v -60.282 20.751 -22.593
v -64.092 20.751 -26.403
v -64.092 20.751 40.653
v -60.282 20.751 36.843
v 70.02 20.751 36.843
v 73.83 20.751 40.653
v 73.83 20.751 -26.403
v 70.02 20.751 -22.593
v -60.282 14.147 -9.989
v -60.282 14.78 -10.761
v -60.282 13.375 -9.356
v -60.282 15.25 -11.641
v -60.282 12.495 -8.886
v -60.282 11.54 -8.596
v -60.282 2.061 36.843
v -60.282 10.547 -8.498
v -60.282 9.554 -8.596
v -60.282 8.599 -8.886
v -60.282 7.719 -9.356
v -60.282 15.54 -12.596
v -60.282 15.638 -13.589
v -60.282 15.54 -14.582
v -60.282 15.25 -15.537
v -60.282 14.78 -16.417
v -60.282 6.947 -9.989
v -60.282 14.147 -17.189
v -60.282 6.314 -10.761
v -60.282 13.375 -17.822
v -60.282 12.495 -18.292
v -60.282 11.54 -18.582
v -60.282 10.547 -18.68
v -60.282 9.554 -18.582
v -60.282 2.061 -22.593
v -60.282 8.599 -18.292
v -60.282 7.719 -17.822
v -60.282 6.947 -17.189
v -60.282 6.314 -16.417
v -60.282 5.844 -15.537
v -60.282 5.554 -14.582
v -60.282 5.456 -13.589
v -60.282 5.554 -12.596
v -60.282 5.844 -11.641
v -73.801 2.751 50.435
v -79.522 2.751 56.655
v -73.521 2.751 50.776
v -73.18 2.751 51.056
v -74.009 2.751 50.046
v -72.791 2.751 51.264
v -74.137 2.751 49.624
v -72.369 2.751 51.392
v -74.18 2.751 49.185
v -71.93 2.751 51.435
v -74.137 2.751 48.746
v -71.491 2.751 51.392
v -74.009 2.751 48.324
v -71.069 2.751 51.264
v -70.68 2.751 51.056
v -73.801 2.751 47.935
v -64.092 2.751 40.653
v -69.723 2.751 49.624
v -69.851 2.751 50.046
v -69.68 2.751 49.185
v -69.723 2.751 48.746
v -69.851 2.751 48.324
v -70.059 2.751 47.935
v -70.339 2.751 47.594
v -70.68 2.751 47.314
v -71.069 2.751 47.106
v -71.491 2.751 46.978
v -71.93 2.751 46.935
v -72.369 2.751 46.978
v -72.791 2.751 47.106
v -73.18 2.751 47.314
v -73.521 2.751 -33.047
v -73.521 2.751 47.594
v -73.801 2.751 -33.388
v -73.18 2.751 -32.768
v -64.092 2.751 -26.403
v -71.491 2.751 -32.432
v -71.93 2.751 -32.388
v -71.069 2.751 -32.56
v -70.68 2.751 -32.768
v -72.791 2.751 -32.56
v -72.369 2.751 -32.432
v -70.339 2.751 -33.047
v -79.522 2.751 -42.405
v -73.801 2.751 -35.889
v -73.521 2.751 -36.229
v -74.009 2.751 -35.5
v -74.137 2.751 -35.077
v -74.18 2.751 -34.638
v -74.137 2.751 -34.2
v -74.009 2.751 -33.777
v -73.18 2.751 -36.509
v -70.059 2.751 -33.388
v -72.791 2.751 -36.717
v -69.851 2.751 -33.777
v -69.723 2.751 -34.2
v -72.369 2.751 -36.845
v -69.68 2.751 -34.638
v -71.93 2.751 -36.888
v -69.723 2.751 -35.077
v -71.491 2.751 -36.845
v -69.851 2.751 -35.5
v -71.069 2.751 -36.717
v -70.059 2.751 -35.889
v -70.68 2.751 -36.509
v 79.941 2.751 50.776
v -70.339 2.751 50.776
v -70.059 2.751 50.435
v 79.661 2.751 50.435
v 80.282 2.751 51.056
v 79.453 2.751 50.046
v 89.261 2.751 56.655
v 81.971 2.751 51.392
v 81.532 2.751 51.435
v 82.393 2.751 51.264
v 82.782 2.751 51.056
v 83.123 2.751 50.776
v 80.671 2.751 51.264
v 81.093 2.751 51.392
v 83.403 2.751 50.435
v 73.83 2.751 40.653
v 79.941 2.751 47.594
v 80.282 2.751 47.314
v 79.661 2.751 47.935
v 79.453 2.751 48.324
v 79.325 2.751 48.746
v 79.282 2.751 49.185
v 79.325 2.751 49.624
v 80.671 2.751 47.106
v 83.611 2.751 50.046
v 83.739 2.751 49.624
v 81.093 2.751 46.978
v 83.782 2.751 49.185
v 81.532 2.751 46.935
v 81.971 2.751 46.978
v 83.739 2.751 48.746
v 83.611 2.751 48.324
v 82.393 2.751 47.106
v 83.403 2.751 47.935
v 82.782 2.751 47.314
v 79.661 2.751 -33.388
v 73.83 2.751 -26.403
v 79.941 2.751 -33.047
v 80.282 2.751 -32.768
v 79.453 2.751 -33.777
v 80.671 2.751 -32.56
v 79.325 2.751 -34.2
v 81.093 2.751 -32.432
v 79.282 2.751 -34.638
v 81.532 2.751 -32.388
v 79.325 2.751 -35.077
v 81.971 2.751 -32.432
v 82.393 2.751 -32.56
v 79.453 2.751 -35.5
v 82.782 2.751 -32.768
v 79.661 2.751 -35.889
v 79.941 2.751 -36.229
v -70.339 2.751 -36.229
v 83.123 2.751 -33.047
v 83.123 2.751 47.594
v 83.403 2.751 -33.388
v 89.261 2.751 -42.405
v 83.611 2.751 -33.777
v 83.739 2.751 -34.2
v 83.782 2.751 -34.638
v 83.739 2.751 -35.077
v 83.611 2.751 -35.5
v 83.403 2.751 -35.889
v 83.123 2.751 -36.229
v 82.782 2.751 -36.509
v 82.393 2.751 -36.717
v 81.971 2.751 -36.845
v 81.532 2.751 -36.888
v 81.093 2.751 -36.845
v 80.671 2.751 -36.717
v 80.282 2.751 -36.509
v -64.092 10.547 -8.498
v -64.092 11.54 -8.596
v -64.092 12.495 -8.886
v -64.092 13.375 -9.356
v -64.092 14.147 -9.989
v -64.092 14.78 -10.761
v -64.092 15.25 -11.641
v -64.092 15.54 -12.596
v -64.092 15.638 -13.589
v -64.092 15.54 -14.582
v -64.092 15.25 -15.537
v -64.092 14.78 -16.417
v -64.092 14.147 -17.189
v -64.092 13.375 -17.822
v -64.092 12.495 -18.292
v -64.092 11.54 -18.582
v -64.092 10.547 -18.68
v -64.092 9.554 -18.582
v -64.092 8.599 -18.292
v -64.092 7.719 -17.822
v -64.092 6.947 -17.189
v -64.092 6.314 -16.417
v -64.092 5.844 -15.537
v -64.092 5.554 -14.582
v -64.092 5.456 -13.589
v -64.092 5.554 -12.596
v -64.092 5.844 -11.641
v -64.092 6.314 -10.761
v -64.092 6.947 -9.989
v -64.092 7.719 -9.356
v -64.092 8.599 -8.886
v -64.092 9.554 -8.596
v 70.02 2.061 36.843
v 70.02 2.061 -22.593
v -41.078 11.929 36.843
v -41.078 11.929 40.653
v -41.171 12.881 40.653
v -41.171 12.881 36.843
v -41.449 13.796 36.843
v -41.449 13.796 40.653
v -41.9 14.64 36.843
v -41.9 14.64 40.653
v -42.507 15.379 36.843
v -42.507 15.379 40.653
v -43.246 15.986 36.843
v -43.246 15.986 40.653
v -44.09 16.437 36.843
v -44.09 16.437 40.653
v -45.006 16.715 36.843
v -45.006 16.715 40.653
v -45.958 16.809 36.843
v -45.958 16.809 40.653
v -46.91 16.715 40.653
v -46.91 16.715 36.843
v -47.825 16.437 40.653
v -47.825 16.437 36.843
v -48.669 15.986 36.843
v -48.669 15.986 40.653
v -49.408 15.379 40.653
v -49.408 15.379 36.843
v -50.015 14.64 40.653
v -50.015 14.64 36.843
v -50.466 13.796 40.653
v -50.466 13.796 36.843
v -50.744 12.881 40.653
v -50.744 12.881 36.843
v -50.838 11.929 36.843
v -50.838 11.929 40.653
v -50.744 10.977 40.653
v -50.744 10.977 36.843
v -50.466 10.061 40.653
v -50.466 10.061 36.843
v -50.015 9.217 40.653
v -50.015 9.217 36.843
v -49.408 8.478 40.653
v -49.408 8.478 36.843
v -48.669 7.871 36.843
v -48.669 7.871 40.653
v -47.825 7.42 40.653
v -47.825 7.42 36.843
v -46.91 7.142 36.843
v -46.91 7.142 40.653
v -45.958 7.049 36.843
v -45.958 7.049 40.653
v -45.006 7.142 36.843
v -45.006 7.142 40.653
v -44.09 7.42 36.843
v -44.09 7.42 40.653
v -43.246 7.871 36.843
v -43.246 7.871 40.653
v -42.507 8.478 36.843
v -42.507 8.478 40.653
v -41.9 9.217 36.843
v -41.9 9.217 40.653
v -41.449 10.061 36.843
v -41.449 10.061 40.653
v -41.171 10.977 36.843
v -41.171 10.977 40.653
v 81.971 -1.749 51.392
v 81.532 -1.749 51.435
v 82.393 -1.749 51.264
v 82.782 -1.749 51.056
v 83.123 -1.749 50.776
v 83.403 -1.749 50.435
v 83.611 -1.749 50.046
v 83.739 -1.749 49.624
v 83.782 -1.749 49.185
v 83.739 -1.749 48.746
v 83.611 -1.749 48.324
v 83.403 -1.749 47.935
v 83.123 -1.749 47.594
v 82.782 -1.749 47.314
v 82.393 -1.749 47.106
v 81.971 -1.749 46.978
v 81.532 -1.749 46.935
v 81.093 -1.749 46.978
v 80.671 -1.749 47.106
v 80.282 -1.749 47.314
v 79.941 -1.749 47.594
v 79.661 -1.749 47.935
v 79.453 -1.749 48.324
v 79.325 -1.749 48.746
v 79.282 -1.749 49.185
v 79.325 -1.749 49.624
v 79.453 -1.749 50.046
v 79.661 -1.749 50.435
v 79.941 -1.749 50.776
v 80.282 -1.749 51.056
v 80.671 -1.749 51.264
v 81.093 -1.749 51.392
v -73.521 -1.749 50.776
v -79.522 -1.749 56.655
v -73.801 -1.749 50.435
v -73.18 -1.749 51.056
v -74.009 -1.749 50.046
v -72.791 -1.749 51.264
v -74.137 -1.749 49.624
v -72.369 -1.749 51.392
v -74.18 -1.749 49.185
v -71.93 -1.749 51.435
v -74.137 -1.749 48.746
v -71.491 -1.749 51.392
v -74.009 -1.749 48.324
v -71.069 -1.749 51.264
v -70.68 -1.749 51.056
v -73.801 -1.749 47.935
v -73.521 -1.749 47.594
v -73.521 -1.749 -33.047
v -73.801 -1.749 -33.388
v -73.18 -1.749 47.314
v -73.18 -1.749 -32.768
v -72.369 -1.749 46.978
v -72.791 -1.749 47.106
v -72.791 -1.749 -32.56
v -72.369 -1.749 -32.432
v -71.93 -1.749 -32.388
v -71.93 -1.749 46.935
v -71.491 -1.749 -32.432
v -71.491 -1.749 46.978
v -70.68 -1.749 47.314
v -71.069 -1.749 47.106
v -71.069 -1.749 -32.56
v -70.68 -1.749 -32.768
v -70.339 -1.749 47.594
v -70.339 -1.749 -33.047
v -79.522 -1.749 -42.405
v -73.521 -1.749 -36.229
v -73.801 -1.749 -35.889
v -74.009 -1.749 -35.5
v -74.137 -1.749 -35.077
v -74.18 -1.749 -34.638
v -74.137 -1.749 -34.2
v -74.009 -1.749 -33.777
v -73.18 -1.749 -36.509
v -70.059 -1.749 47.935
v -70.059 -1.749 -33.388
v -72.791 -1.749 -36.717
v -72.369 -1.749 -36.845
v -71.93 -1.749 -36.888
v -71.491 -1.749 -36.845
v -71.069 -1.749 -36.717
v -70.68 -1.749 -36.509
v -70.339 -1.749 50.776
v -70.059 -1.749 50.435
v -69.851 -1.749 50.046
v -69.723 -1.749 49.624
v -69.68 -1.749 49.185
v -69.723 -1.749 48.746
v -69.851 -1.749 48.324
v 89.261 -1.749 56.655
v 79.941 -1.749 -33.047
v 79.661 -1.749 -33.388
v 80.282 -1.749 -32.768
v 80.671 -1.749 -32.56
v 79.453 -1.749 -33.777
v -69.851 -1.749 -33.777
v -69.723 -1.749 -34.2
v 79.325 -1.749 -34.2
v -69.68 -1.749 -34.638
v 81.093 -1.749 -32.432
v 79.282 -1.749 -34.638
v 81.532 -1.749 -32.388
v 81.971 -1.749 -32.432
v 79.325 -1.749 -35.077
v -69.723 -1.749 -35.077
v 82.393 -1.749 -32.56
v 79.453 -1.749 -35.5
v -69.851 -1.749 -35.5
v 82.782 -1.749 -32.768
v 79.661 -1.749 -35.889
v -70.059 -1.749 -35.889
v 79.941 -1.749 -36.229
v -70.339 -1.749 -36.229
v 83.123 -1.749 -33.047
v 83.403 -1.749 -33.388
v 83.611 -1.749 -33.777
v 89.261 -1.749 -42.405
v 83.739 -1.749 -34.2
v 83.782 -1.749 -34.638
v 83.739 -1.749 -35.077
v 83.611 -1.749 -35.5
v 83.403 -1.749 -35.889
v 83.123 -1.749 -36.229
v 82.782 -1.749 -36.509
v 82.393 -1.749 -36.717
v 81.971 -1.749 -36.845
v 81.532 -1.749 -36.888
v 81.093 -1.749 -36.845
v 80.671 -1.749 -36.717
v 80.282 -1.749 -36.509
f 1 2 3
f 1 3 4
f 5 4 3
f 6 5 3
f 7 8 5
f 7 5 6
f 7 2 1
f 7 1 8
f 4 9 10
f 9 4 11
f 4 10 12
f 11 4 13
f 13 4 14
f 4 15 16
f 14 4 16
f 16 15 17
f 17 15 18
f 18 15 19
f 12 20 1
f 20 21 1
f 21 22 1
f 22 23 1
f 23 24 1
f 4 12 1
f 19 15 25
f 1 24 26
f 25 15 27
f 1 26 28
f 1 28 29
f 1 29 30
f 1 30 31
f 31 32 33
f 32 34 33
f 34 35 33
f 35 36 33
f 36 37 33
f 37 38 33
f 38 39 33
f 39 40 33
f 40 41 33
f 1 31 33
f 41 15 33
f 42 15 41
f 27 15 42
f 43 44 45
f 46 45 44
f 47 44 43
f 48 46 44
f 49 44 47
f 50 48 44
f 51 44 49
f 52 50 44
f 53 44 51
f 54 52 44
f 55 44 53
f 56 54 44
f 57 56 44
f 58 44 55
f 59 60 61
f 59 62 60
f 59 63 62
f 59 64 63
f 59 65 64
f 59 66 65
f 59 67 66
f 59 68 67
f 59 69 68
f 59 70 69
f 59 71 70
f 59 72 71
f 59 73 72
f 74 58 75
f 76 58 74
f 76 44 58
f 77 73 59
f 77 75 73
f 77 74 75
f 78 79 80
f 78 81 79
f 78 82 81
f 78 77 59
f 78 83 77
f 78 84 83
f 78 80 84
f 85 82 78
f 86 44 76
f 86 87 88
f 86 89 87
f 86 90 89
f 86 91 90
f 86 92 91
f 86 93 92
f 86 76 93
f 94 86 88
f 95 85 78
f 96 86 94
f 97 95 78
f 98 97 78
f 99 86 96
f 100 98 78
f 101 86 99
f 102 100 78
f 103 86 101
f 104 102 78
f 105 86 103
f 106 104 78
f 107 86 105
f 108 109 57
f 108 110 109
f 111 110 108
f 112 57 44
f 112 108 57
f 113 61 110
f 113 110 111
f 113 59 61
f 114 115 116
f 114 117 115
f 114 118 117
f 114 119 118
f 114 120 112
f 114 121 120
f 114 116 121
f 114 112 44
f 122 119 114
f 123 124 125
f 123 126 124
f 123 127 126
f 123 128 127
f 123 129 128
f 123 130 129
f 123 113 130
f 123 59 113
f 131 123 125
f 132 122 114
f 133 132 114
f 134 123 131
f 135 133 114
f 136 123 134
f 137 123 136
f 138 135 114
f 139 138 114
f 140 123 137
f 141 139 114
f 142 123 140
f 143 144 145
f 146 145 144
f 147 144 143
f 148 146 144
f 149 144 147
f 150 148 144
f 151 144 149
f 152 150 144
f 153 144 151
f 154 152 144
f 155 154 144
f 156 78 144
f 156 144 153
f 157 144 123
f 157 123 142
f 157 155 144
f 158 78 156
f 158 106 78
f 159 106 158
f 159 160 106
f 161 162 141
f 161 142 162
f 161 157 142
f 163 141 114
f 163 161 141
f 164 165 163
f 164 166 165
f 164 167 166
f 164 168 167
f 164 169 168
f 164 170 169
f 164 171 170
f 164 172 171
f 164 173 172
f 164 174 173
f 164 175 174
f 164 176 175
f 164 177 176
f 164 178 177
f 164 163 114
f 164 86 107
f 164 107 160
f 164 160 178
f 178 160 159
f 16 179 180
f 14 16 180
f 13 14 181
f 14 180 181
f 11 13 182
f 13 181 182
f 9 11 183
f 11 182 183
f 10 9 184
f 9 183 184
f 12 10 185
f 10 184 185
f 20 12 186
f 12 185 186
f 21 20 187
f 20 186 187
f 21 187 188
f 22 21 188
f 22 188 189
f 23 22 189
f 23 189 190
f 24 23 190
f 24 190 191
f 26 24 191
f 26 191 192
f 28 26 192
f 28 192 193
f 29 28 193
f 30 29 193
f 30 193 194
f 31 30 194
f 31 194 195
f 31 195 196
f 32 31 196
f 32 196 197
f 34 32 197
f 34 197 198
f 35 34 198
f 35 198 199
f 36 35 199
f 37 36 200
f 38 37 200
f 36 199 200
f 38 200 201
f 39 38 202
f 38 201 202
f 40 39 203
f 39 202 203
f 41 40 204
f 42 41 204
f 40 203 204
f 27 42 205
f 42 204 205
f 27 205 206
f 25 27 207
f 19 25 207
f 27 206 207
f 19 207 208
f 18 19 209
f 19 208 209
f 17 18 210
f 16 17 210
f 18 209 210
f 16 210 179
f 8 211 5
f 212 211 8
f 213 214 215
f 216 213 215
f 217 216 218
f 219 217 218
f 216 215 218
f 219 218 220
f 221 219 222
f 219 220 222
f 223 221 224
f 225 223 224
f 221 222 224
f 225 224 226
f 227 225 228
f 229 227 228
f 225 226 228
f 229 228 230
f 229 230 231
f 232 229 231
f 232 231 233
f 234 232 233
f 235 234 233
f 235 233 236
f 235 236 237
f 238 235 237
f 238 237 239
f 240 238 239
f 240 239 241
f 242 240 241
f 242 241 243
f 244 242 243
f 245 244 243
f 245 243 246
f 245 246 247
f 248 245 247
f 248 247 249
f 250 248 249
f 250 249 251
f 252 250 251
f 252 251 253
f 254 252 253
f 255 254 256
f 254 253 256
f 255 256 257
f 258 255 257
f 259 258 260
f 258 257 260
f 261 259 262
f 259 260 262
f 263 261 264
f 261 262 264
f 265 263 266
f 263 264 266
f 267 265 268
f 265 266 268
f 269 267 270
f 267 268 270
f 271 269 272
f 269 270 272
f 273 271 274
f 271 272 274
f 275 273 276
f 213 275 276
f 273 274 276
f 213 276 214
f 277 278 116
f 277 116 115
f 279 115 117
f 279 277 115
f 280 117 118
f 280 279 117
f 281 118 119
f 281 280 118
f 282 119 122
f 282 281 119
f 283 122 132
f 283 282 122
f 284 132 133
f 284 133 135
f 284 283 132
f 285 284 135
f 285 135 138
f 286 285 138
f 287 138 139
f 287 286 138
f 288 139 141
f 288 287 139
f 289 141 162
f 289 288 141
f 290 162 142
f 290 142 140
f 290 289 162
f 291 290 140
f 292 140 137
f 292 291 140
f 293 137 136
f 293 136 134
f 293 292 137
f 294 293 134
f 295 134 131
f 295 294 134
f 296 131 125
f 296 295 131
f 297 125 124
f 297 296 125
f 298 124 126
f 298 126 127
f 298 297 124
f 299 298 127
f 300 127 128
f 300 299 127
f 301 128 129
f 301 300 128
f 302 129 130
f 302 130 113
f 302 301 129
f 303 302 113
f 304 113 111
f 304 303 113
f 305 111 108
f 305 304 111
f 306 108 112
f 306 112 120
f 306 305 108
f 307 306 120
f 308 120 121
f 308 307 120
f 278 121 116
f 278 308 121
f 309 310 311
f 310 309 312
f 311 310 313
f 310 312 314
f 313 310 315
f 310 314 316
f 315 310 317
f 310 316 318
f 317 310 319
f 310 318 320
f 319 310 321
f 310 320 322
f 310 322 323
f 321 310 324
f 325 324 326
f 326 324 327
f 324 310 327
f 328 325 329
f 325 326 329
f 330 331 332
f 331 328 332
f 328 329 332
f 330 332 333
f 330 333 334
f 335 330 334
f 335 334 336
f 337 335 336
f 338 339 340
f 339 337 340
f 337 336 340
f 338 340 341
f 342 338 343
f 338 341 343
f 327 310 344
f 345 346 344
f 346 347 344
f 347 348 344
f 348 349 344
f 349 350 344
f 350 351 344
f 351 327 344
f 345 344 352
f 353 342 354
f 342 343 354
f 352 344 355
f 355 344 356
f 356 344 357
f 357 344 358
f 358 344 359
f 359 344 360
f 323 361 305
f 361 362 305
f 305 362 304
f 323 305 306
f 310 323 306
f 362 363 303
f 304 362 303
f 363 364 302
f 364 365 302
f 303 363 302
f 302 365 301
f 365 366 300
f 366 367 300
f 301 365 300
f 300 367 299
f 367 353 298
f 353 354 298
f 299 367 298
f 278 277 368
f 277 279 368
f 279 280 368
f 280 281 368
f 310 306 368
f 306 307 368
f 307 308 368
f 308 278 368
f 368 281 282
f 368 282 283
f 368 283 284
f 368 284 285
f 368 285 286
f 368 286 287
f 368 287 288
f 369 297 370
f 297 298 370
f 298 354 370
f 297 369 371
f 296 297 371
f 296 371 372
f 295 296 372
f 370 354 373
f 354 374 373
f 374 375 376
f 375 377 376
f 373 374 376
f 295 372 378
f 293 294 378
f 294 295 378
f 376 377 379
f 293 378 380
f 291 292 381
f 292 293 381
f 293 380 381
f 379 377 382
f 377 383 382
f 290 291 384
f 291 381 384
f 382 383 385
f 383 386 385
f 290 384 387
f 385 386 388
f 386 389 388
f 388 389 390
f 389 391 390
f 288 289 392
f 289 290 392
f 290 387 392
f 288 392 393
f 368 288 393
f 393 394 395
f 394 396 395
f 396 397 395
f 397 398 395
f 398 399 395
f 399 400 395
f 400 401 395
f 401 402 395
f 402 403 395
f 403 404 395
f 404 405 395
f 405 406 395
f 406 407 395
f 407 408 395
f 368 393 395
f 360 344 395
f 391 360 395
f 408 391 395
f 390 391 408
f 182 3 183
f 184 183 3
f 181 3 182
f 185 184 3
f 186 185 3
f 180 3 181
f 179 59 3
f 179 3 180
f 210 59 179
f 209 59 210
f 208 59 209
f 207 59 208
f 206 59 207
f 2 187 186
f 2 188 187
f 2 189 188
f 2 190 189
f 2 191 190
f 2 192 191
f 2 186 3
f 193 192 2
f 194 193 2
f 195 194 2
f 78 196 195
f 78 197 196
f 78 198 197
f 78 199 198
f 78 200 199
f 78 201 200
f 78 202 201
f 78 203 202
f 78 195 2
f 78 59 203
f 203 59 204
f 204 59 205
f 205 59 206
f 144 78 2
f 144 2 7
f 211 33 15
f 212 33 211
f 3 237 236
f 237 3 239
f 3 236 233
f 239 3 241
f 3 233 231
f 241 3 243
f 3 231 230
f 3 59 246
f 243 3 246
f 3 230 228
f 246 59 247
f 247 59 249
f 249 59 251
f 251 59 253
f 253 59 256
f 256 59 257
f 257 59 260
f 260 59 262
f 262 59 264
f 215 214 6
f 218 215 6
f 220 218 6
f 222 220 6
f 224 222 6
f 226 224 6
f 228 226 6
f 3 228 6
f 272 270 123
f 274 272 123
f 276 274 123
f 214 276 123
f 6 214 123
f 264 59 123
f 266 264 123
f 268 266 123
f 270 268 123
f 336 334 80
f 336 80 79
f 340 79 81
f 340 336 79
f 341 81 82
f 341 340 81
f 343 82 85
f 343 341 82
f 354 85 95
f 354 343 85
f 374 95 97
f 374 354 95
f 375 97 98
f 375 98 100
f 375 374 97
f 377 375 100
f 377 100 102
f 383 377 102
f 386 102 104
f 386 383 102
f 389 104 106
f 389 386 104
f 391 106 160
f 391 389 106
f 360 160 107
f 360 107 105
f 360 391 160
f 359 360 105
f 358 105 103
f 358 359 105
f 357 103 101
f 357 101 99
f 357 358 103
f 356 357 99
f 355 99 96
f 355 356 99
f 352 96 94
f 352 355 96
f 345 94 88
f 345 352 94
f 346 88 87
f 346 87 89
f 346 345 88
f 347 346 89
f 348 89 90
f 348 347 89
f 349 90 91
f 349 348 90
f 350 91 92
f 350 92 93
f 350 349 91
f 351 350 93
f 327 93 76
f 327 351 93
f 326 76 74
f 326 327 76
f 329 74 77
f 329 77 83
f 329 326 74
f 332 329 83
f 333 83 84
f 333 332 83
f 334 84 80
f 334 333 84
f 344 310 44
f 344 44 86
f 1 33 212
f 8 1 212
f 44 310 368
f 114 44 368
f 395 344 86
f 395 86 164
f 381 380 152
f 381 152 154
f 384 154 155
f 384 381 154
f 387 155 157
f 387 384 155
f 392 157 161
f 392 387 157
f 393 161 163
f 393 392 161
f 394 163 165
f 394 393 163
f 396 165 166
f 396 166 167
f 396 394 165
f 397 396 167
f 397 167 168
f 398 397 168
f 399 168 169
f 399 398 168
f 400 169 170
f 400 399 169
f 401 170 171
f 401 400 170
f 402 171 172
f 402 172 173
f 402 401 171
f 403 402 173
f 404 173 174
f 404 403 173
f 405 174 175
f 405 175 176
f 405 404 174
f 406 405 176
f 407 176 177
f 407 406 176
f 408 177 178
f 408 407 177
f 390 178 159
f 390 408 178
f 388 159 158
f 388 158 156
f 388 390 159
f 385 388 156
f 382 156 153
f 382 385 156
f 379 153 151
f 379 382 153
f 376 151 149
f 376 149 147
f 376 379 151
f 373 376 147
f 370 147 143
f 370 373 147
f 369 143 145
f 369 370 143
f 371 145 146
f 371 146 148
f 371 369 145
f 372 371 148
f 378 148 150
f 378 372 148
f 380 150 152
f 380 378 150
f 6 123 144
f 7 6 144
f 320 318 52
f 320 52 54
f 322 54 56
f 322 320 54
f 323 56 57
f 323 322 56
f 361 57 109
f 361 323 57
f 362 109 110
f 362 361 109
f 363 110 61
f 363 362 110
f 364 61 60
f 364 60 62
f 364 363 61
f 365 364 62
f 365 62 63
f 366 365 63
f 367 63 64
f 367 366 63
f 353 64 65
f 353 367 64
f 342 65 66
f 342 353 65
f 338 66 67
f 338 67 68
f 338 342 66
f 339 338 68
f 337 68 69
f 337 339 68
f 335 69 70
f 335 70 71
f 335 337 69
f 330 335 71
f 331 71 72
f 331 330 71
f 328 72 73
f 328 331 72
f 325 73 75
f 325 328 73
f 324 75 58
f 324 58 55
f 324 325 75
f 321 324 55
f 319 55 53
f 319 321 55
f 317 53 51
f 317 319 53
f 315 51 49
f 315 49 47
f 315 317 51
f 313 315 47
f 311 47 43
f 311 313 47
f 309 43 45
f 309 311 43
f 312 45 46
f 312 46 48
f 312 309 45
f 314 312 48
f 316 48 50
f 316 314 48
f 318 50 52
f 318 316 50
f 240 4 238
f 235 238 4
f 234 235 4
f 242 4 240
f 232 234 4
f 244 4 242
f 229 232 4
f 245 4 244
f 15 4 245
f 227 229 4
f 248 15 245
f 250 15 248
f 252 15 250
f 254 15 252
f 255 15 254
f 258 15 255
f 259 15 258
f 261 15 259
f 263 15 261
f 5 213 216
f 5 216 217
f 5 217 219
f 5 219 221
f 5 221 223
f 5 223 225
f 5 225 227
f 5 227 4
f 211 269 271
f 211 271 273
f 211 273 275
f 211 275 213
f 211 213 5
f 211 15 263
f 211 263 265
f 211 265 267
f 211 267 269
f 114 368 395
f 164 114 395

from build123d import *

# Parameters (mm, degrees)
SKETCH1_W           = 112.522
SKETCH1_H           = 66.04
SKETCH1_R           = 1.5
BOSS_EXTRUDE1_DEPTH = 3
SKETCH4_W           = 91.948
SKETCH4_H           = 44.704
BOSS_EXTRUDE2_DEPTH = 12
SHELL1_T            = -2.54
SKETCH13_R          = 3.253406585
CUT_EXTRUDE1_DEPTH  = 8.19
SKETCH15_R          = 3.393829234
CUT_EXTRUDE2_DEPTH  = 8.19
SCALE1_SCALE        = 1.5


with BuildPart() as part:
    # Sketch1 → Boss-Extrude1 (new body)
    with BuildSketch(Plane(origin=(0, 0, 0), x_dir=(1, 0, 0), z_dir=(0, 1, 0))):
        with Locations((4.991983213, -7.115654676)):
            Rectangle(SKETCH1_W, SKETCH1_H)
        with Locations(Location((-46.207741765, 20.726518927, 0), (0, 0, 270))):
            Circle(SKETCH1_R, mode=Mode.SUBTRACT)
        with Locations(Location((56.100367261, 20.726518927, 0), (0, 0, 270))):
            Circle(SKETCH1_R, mode=Mode.SUBTRACT)
        with Locations(Location((56.100367261, -35.155923699, 0), (0, 0, 270))):
            Circle(SKETCH1_R, mode=Mode.SUBTRACT)
        with Locations(Location((-46.207741765, -35.155923699, 0), (0, 0, 270))):
            Circle(SKETCH1_R, mode=Mode.SUBTRACT)
    extrude(amount=BOSS_EXTRUDE1_DEPTH)

    # Sketch4 → Boss-Extrude2 (add)
    with BuildSketch(Plane(origin=(0, 3, 0), x_dir=(1, 0, 0), z_dir=(0, 1, 0))):
        with Locations((4.991983213, -7.115654676)):
            Rectangle(SKETCH4_W, SKETCH4_H)
    extrude(amount=BOSS_EXTRUDE2_DEPTH)

    # Shell1
    shell1_openings = [part.faces().sort_by_distance(p)[0] for p in [
        (4.991983213, 15, 7.115654676),
    ]]
    offset(amount=SHELL1_T, openings=shell1_openings, kind=Kind.INTERSECTION)

    # Sketch13 → Cut-Extrude1 (cut)
    with BuildSketch(Plane.XY.offset(29.467654676)):
        with Locations((-28.892784248, 9.118527178)):
            Circle(SKETCH13_R)
    extrude(amount=-CUT_EXTRUDE1_DEPTH, mode=Mode.SUBTRACT)

    # Sketch15 → Cut-Extrude2 (cut)
    with BuildSketch(Plane.ZY.offset(40.982016787)):
        with Locations((-6.693412029, 8.197427611)):
            Circle(SKETCH15_R)
    extrude(amount=-CUT_EXTRUDE2_DEPTH, mode=Mode.SUBTRACT)


with BuildPart() as part_1:
    # Scale1: scaled about (5.236972756, 3.498136201, 7.097395086)
    add(part.part.scale(SCALE1_SCALE).moved(Location((-2.618486378, -1.7490681, -3.548697543))))


solid = part_1.part
